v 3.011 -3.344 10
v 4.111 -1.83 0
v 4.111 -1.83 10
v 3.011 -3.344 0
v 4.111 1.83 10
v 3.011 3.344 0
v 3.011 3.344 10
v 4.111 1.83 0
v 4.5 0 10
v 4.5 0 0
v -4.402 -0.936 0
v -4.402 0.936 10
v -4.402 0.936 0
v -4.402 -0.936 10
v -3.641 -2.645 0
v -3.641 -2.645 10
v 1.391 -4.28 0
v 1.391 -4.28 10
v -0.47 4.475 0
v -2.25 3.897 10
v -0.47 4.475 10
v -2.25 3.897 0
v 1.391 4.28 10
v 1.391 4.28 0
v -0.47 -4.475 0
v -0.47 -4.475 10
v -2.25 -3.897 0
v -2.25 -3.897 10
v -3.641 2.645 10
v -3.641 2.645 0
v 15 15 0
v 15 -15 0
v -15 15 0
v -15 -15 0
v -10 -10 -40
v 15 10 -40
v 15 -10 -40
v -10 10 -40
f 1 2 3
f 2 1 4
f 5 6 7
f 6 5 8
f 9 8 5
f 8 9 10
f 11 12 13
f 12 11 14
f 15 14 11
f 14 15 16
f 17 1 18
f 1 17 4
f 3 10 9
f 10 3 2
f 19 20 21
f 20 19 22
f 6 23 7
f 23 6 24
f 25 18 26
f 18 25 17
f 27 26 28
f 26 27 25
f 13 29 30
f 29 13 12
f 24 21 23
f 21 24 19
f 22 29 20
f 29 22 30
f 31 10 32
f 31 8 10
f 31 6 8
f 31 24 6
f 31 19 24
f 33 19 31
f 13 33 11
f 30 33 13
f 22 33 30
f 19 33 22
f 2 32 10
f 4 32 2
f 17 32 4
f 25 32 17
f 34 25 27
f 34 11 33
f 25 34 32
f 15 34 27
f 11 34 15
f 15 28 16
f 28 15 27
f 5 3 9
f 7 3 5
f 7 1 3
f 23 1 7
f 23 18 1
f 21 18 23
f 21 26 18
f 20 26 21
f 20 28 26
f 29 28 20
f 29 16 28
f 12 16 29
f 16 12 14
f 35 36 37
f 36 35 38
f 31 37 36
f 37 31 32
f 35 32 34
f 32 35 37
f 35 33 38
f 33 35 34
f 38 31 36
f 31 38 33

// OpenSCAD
module case_foot() {
    cylinder(10, 9/2, 9/2);
    //cube([30,30,40]);
    CubePoints = [
      [  5,  5,  0 ],  //0
      [ 30,  5,  0 ],  //1
      [ 30, 25,  0 ],  //2
      [  5, 25,  0 ],  //3
      [  0,  0, 40 ],  //4
      [ 30,  0, 40 ],  //5
      [ 30, 30, 40 ],  //6
      [  0, 30, 40 ]   //7
    ];
      
    CubeFaces = [
      [0,1,2,3],  // bottom
      [4,5,1,0],  // front
      [7,6,5,4],  // top
      [5,6,2,1],  // right
      [6,7,3,2],  // back
      [7,4,0,3]   // left
    ];
      
   translate([-15,-15,-40]) polyhedron( CubePoints, CubeFaces );
}

case_foot();
